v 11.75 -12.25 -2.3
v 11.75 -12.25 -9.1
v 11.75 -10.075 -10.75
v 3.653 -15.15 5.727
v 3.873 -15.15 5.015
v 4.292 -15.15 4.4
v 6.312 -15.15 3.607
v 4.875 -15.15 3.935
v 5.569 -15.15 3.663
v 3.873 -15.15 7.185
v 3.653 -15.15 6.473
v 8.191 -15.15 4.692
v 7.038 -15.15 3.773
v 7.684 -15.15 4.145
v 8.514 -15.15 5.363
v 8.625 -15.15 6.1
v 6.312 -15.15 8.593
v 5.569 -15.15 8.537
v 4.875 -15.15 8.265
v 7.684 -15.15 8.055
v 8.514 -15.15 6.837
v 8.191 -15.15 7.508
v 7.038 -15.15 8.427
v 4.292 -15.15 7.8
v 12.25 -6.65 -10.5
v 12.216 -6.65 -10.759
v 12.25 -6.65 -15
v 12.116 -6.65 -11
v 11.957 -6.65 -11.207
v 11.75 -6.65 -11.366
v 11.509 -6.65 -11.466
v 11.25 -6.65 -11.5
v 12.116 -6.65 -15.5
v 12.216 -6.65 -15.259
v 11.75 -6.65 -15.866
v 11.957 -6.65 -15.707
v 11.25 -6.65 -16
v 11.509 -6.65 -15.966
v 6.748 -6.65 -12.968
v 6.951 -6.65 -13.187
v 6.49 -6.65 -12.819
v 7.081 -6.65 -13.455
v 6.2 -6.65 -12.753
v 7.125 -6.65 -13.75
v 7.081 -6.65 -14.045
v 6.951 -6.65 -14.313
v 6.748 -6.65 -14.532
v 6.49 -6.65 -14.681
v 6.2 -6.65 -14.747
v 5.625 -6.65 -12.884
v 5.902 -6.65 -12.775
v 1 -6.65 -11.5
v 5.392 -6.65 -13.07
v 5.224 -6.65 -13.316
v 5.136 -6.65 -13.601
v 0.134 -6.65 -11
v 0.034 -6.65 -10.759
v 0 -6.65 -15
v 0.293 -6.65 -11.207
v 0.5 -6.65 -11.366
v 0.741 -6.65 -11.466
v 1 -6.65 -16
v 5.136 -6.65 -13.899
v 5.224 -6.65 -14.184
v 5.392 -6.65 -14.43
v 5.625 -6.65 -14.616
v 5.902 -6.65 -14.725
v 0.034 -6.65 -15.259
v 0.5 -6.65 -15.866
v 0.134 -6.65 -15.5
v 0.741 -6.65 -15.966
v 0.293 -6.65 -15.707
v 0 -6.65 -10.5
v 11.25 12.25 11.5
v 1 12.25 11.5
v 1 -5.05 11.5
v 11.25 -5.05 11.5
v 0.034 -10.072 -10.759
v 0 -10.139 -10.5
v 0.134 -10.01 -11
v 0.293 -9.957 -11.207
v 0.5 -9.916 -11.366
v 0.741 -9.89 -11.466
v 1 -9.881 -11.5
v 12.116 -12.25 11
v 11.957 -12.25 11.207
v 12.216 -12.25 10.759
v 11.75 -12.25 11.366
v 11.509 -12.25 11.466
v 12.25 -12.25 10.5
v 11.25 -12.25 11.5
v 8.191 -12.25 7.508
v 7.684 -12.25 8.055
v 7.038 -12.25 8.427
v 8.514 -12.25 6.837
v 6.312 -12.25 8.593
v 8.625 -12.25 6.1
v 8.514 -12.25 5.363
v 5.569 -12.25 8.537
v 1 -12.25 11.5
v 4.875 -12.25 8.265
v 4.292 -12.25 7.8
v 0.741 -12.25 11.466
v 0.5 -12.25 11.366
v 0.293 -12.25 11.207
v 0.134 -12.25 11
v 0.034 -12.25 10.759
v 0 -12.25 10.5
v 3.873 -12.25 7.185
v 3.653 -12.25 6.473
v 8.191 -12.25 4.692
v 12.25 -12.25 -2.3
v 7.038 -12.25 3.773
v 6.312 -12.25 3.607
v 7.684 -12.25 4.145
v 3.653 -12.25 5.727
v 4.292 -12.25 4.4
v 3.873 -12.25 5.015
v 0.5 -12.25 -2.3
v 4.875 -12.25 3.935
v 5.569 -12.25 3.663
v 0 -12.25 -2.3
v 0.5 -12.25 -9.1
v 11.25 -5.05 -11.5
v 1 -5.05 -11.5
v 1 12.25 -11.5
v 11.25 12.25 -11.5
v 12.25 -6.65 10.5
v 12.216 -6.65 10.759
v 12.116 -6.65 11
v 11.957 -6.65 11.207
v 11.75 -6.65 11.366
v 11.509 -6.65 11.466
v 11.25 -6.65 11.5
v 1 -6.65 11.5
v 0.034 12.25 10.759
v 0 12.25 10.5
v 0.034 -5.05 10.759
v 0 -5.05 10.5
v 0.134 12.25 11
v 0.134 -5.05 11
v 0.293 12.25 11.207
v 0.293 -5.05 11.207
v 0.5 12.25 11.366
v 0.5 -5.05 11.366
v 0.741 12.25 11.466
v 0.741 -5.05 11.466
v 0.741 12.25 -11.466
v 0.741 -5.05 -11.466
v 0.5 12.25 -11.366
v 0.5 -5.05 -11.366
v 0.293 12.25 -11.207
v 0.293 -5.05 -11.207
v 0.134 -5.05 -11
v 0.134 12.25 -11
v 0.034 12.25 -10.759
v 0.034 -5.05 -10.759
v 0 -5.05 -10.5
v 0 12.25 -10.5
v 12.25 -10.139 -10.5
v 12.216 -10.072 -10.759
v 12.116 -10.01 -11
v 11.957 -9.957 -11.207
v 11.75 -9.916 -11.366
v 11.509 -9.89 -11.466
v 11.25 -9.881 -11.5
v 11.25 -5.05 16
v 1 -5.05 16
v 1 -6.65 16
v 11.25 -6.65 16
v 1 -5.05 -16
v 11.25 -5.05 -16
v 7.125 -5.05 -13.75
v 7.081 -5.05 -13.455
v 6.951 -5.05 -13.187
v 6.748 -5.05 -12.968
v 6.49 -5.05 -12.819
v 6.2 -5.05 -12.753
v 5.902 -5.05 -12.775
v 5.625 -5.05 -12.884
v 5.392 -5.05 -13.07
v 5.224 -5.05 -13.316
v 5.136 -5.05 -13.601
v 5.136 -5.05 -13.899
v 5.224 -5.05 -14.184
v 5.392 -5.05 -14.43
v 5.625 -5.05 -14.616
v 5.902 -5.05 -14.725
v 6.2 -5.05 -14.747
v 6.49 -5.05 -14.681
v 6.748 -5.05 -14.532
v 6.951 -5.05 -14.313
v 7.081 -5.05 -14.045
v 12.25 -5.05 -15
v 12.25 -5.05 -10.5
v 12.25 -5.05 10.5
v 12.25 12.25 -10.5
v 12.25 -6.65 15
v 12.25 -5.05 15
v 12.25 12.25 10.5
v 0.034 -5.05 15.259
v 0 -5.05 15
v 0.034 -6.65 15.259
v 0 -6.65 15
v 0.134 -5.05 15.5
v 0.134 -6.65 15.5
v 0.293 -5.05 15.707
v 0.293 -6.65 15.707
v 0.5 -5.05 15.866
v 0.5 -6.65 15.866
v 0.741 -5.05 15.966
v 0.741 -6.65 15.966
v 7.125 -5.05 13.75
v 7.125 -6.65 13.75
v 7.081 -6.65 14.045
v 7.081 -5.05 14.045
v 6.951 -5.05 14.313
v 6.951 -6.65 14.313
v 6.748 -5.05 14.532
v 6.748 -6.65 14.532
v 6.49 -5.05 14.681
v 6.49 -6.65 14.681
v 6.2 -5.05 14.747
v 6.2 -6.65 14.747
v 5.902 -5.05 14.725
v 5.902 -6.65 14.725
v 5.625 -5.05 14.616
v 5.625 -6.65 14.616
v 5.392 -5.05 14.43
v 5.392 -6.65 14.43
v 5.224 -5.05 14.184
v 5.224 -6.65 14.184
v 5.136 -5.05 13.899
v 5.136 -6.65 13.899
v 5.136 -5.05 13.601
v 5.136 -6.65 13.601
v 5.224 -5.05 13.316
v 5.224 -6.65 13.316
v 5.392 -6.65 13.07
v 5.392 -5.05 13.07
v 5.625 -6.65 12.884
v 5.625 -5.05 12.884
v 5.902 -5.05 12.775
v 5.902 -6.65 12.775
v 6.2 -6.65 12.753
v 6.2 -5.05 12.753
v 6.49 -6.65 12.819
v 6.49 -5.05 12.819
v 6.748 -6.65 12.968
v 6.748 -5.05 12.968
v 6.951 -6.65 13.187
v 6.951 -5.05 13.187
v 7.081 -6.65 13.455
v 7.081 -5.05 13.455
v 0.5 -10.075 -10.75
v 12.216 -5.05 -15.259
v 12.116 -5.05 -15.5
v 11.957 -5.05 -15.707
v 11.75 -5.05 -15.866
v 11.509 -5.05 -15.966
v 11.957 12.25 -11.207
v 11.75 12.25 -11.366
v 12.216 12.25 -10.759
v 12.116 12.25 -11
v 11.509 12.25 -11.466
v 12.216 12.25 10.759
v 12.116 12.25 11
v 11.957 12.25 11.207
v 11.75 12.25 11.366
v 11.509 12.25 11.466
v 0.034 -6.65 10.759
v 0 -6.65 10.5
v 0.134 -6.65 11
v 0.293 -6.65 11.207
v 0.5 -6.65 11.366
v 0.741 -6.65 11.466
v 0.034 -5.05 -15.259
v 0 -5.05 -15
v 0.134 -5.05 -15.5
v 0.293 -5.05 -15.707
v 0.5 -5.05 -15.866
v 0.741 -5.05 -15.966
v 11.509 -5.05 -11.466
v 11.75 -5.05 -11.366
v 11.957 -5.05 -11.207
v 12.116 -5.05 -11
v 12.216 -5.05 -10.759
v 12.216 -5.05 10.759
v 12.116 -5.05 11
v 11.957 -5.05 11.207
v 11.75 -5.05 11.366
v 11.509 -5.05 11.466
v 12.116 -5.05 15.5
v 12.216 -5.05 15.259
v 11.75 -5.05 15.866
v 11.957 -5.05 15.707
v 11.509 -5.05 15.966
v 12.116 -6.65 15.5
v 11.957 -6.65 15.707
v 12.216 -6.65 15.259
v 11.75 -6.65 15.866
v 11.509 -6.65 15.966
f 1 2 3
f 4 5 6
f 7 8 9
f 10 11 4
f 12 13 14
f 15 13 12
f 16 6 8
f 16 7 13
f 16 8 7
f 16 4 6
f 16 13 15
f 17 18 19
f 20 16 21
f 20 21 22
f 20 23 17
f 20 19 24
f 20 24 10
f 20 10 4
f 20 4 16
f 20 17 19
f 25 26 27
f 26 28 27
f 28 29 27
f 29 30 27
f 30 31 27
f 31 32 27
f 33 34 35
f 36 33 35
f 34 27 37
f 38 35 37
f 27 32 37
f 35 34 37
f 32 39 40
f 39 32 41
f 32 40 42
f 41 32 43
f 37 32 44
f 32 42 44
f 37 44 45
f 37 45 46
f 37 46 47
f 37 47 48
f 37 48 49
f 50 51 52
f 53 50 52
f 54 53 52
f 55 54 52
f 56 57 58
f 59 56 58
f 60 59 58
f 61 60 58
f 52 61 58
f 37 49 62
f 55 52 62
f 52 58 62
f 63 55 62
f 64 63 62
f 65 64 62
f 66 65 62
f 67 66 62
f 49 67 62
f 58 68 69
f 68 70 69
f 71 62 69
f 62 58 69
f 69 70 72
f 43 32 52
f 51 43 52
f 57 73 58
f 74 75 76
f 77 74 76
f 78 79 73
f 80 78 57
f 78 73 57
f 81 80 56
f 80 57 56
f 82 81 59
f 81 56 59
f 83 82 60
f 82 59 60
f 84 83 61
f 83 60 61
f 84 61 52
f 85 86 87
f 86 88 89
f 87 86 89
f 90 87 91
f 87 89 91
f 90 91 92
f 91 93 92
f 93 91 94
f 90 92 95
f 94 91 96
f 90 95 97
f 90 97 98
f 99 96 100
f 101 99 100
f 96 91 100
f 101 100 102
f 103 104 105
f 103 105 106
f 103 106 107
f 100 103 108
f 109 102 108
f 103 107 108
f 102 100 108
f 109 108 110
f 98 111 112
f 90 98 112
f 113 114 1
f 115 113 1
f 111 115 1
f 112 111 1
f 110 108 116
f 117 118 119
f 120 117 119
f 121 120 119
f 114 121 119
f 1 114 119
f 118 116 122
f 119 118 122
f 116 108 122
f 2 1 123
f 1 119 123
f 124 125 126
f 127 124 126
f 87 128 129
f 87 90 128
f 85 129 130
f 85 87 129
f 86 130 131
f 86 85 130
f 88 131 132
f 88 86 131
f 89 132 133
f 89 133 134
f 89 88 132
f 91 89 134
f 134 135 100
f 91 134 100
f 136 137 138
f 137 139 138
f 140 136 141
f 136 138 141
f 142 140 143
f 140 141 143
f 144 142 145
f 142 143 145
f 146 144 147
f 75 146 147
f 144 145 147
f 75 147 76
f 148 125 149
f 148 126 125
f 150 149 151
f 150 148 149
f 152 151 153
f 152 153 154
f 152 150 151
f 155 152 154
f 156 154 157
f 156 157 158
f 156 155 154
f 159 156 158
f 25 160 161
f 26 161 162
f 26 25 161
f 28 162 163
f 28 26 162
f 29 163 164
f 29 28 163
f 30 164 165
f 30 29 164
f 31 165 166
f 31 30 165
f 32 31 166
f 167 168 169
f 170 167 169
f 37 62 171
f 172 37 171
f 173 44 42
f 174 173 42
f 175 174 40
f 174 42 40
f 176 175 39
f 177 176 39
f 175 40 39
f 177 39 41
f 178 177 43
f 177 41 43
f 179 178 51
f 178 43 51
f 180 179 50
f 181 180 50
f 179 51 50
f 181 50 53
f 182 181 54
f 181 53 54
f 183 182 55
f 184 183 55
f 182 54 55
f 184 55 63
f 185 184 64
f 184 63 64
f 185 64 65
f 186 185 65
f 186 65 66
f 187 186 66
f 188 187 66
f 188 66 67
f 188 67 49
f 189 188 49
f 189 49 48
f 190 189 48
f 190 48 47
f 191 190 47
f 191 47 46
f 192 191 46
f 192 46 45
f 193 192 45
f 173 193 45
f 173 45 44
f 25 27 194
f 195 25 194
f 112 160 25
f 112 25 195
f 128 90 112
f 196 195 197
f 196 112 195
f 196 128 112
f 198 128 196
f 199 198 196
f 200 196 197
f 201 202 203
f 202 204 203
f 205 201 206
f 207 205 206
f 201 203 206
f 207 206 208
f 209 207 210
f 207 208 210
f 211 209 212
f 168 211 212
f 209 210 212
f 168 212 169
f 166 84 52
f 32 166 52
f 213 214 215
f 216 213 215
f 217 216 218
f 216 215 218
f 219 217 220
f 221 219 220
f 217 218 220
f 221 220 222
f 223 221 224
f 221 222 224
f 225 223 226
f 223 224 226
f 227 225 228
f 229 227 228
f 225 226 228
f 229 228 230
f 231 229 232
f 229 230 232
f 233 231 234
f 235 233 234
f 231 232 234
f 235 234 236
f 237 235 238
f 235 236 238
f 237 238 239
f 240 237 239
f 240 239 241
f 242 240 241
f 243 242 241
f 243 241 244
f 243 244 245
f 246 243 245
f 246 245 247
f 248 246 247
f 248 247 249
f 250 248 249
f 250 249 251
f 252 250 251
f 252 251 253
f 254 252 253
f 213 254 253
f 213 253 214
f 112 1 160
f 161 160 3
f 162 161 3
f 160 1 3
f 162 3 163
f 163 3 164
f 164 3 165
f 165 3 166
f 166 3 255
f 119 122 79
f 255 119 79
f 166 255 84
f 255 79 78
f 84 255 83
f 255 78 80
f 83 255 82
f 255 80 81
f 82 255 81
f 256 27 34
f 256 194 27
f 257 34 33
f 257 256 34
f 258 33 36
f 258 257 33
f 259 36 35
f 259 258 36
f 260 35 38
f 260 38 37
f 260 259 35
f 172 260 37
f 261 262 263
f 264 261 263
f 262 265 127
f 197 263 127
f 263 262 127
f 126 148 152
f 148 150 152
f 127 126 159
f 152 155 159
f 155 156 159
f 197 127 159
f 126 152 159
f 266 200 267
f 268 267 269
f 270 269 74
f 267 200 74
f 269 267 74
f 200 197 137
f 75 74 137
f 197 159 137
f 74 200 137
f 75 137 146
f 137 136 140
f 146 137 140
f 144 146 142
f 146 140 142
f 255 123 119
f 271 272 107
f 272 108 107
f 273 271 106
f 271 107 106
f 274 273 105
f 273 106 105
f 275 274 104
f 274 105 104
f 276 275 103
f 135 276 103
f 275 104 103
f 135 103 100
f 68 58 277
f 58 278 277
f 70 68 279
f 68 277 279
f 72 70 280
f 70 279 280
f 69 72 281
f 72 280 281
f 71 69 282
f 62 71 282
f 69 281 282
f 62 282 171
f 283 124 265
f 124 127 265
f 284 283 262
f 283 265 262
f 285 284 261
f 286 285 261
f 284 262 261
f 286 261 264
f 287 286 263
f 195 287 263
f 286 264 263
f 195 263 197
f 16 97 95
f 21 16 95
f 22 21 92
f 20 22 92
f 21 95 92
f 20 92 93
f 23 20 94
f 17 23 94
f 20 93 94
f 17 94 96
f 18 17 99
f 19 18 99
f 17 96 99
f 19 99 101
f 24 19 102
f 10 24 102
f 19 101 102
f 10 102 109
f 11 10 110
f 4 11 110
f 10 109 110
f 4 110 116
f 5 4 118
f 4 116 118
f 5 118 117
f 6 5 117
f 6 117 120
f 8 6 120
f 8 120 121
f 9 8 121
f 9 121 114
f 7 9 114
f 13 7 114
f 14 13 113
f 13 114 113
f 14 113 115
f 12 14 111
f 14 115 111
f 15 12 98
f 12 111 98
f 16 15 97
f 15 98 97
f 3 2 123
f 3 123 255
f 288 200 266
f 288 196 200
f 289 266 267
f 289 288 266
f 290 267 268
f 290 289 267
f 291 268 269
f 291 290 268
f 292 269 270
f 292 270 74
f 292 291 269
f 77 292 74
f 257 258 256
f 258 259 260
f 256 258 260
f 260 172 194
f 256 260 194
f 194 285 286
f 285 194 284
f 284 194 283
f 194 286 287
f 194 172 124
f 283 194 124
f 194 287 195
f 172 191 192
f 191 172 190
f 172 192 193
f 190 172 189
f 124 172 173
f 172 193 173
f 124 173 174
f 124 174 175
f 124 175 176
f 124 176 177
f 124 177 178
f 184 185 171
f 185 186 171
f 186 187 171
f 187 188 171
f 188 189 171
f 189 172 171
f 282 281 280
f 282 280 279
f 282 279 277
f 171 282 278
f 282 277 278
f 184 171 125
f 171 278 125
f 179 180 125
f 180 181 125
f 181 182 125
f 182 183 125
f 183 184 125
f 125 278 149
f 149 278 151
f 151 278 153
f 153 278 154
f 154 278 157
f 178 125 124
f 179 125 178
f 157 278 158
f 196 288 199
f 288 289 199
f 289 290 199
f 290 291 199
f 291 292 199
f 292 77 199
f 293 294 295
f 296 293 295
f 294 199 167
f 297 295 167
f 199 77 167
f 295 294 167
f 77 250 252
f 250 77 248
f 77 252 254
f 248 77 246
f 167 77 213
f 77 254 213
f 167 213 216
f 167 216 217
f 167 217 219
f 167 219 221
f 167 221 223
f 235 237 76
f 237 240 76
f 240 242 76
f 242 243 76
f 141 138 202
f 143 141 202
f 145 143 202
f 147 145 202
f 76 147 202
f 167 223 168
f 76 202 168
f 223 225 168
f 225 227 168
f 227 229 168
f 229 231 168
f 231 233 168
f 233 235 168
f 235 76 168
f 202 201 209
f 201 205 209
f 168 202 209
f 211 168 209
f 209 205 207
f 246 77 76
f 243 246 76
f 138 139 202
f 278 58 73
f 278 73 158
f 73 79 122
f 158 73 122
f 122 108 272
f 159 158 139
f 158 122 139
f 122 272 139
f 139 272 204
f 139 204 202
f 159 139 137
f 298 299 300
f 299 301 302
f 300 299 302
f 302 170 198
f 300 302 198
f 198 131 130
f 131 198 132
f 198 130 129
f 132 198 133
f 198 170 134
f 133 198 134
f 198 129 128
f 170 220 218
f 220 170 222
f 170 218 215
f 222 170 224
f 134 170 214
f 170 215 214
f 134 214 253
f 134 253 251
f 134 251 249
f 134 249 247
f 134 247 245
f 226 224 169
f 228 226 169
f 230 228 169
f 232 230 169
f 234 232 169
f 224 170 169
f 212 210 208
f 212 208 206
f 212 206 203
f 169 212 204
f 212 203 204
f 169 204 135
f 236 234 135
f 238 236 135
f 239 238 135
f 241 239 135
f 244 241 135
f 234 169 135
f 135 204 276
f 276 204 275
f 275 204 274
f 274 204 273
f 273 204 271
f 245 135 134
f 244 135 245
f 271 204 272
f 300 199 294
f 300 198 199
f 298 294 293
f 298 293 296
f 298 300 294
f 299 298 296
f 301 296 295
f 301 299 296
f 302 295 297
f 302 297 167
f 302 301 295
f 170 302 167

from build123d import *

# Parameters (mm, degrees)
F1_DEPTH = 12.25
F5_DEPTH = 11.25
F6_R     = 2.5
F7_DEPTH = 2.9
F8_R     = 1
F9_DEPTH = 18.901
F10_R    = 1


with BuildPart() as f1:
    # F0 (on Right) → F1 (new body)
    with BuildSketch(Plane.YZ):
        Polygon((-5.05, -11.5), (12.25, -11.5), (12.25, 11.5), (-5.05, 11.5), (-5.05, 16), (-6.65, 16), (-6.65, 11.5), (-12.25, 11.5), (-12.25, -2.3), (-9.8814561435, -11.5), (-6.65, -11.5), (-6.65, -16), (-5.05, -16), align=None)
    extrude(amount=F1_DEPTH)

    # F4 (on offset) → F5 (join, through all)
    with BuildSketch(Plane.YZ.offset(11.75)):
        Polygon((-10.0745439579, -10.75), (-12.25, -2.3), (-12.25, -9.1), align=None)
    extrude(amount=-F5_DEPTH)

    # F6 (on face) → F7 (join)
    with BuildSketch(Plane.XZ.offset(12.25)):
        with Locations((6.125, 6.1)):
            Circle(F6_R)
    extrude(amount=F7_DEPTH)

    # F8 (on face) → F9 (cut, through all)
    with BuildSketch(Plane.XZ.offset(6.65)):
        with Locations((6.125, 13.75)):
            Circle(F8_R)
        with Locations((6.125, -13.75)):
            Circle(F8_R)
    extrude(amount=-F9_DEPTH, mode=Mode.SUBTRACT)

    # F10
    f10_edges = [f1.edges().sort_by_distance(p)[0] for p in [
        (12.25, 3.6, 11.5),
        (12.25, -9.45, 11.5),
        (12.25, 3.6, -11.5),
        (12.25, -8.265728, -11.5),
        (0, -8.265728, -11.5),
        (0, 3.6, -11.5),
        (0, 3.6, 11.5),
        (0, -9.45, 11.5),
        (0, -5.85, 16),
        (12.25, -5.85, 16),
        (0, -5.85, -16),
        (12.25, -5.85, -16),
    ]]
    fillet(f10_edges, radius=F10_R)


solid = f1.part
